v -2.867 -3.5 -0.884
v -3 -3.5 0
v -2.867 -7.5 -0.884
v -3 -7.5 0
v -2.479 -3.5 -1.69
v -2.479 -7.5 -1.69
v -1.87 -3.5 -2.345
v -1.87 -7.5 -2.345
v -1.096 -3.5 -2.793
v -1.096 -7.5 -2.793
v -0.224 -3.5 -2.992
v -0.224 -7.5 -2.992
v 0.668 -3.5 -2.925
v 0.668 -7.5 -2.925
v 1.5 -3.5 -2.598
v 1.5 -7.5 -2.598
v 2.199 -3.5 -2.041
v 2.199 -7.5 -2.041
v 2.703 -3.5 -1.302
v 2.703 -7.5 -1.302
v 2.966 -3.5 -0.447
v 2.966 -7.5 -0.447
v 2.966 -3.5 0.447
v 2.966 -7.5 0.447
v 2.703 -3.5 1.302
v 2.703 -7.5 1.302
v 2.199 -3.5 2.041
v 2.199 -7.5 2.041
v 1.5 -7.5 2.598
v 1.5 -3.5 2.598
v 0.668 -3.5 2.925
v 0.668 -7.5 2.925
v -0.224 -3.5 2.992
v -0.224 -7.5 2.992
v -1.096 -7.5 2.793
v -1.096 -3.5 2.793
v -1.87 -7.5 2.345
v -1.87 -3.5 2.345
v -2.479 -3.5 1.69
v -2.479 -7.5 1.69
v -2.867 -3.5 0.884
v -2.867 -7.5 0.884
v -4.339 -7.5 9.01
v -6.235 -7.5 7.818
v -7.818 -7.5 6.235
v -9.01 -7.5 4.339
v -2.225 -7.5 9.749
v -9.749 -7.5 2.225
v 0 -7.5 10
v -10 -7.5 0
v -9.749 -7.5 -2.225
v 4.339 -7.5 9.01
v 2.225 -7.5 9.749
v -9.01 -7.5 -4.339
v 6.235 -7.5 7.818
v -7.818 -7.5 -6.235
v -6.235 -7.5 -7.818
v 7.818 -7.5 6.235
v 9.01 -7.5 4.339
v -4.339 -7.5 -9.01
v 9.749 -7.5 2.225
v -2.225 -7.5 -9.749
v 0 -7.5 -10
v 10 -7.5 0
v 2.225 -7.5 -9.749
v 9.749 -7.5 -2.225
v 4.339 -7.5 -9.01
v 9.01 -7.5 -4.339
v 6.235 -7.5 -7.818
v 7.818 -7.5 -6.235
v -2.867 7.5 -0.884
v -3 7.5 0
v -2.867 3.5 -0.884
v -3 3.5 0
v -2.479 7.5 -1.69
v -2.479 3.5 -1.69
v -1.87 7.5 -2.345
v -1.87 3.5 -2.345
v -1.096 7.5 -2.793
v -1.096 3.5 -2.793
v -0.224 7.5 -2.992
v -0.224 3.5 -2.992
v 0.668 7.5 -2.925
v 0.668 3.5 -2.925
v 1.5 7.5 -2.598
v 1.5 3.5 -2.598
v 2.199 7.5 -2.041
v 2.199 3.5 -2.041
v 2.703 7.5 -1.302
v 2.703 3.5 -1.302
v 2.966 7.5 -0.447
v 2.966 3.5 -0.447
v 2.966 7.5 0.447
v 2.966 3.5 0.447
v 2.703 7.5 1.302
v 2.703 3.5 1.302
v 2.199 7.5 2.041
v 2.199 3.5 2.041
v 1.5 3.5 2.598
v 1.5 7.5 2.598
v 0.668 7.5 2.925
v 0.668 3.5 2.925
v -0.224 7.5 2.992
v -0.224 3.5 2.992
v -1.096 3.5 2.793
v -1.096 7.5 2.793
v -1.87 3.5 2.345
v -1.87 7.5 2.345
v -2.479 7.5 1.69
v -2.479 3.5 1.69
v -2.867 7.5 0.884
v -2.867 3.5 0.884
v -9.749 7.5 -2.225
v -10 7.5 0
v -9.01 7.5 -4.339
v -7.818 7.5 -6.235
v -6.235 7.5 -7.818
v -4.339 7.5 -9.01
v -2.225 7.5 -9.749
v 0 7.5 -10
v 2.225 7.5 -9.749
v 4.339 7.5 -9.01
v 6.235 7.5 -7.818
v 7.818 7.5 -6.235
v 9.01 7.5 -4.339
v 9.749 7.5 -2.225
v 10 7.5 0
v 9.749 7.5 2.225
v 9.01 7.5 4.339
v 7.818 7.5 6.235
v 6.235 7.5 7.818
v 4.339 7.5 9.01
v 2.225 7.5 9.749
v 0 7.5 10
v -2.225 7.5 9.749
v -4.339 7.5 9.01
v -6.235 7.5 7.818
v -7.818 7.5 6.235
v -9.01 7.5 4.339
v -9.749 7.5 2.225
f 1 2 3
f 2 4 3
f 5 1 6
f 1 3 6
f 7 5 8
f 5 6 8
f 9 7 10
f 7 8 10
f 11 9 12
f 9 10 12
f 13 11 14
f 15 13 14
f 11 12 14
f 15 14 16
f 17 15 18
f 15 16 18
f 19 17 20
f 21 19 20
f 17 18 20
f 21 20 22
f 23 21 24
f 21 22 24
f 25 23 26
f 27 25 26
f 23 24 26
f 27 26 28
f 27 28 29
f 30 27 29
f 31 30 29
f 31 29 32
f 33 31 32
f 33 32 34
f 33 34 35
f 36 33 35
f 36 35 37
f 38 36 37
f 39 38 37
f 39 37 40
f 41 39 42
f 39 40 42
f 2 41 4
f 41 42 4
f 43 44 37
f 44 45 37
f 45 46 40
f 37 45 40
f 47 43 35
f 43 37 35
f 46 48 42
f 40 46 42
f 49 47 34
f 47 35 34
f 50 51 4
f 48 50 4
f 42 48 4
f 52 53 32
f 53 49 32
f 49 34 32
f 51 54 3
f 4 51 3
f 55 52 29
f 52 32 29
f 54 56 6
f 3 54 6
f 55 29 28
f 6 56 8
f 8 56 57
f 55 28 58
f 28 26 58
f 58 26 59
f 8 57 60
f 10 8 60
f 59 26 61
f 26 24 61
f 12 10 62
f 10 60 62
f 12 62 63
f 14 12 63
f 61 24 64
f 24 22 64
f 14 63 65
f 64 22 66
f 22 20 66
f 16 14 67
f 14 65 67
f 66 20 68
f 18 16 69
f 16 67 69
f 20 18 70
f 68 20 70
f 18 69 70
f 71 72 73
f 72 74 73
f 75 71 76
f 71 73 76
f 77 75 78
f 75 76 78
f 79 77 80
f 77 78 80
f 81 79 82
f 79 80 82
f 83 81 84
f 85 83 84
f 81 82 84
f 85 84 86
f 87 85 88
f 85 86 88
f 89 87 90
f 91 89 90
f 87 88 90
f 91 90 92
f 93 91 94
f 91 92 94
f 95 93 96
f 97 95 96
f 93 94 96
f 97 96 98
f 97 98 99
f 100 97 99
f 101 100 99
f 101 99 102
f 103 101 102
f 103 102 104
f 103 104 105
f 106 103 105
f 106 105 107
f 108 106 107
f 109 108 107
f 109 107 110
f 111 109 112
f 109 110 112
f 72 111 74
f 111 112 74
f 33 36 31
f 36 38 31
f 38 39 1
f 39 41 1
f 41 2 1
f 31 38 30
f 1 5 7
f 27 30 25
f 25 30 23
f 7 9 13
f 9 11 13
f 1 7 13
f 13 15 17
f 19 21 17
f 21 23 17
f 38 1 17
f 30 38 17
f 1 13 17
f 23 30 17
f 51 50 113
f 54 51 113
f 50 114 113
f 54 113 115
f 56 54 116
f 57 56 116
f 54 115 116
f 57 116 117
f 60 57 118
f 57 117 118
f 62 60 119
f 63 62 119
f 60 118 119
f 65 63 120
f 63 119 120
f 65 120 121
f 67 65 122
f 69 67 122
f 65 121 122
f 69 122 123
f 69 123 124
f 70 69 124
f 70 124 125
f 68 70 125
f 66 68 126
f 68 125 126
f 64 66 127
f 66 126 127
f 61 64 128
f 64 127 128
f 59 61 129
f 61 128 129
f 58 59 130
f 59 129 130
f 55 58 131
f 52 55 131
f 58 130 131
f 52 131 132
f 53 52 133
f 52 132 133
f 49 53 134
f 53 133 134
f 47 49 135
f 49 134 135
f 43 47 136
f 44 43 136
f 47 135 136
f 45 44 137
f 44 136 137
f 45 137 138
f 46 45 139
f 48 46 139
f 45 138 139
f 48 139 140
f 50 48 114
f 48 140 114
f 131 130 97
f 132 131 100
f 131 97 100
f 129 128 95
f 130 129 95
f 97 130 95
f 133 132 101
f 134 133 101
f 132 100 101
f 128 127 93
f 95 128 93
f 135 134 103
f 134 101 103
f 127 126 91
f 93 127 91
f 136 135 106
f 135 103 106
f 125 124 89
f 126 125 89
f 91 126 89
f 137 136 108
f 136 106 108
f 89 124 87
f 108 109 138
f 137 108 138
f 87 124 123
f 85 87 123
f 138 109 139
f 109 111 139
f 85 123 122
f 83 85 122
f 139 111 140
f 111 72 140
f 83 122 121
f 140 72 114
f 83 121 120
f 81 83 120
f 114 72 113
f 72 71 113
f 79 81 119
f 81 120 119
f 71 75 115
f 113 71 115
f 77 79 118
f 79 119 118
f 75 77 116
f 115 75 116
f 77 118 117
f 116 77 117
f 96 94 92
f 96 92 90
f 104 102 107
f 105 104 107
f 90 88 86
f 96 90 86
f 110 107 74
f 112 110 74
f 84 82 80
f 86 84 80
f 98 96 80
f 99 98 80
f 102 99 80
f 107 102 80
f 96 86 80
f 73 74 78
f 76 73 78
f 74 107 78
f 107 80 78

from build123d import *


with BuildPart() as part:
    # 草图1 → 旋转3 (revolve)
    with BuildSketch(Plane.XY, mode=Mode.PRIVATE) as revolve_3_sk:
        Polygon((0, 3.5), (0, 0), (10, 0), (10, 7.5), (3, 7.5), (3, 3.5), align=None)
        Polygon((10, 0), (0, 0), (0, -3.5), (3, -3.5), (3, -7.5), (10, -7.5), align=None)
    revolve(revolve_3_sk.sketch.rotate(Axis((0, 3.5, 0), (0, -1, 0)), 180), axis=Axis((0, 3.5, 0), (0, -1, 0)))


solid = part.part
